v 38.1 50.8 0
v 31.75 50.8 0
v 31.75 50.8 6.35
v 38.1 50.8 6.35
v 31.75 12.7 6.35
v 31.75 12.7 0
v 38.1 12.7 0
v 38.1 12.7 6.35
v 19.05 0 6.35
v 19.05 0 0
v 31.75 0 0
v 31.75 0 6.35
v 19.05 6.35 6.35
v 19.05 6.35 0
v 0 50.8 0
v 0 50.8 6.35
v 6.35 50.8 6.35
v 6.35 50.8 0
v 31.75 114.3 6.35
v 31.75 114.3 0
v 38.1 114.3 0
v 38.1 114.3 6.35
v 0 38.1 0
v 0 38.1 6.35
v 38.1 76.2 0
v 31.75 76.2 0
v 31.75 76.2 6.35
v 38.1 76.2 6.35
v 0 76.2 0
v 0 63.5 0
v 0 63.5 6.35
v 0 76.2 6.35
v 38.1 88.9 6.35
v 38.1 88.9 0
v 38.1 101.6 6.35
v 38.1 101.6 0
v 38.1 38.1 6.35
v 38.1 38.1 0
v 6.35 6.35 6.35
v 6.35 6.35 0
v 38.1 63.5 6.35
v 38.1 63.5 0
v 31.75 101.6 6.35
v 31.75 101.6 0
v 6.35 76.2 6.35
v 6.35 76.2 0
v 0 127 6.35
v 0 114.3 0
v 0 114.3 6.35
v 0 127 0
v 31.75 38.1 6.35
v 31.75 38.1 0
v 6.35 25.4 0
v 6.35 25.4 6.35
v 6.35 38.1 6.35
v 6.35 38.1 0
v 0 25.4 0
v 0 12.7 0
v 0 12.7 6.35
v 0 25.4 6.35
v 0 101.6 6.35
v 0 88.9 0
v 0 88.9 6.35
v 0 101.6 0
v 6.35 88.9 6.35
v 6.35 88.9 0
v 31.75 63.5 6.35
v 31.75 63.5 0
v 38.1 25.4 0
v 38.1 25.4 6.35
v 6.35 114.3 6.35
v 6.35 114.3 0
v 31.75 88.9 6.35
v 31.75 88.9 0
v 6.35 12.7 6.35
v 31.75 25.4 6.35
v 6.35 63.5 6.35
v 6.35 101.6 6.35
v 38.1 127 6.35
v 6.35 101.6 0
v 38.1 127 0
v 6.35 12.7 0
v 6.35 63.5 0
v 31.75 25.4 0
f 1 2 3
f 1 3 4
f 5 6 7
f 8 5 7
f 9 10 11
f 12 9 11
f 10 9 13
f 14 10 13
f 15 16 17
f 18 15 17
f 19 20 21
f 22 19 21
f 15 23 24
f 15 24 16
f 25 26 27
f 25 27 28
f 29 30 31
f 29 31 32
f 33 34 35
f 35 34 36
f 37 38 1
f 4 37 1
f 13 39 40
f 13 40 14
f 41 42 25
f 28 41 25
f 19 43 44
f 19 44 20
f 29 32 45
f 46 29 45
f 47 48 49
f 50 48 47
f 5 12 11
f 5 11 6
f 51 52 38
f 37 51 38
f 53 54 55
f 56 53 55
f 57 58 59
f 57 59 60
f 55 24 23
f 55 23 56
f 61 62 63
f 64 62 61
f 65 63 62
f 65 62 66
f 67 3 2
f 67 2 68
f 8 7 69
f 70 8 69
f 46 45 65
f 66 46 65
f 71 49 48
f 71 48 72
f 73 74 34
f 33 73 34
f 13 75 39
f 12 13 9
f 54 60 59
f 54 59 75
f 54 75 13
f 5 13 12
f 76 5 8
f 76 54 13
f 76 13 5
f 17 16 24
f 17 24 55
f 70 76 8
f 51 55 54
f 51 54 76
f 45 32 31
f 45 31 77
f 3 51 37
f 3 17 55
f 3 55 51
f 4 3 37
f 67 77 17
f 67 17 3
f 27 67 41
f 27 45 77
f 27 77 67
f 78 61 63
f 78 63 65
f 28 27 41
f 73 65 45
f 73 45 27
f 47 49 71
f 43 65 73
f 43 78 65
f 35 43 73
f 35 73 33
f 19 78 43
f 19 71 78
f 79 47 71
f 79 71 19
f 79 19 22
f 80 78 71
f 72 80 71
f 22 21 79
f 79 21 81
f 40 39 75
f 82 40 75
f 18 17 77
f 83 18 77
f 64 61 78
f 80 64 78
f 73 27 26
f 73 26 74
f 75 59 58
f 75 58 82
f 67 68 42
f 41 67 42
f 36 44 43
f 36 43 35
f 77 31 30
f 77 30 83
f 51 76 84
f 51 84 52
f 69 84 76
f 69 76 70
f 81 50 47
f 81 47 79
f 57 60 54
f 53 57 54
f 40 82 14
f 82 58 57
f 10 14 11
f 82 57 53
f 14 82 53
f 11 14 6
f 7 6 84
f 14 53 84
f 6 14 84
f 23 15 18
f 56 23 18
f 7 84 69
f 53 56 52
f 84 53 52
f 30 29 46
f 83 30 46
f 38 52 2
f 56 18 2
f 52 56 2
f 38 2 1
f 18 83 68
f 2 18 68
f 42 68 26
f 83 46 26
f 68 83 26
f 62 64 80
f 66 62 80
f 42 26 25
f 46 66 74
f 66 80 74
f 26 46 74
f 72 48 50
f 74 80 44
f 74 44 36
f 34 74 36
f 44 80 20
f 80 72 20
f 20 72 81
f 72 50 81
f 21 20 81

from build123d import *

# Parameters (mm, degrees)
SKETCH1_W           = 38.1
SKETCH1_H           = 127
BOSS_EXTRUDE1_DEPTH = 6.35
SKETCH2_W           = 6.35
SKETCH2_H           = 12.7
CUT_EXTRUDE1_DEPTH  = 7.35
LPATTERN1_COUNT     = 6
LPATTERN1_PITCH     = 25.4
SKETCH3_W           = 12.7
SKETCH3_H           = 6.35
CUT_EXTRUDE2_DEPTH  = 7.35


with BuildPart() as part:
    # Sketch1 → Boss-Extrude1 (new body)
    with BuildSketch(Plane.XY):
        with Locations((19.05, 63.5)):
            Rectangle(SKETCH1_W, SKETCH1_H)
    extrude(amount=BOSS_EXTRUDE1_DEPTH)

    # Sketch2 → Cut-Extrude1 (cut, through all)
    with BuildSketch(Plane.XY.offset(6.35)):
        with Locations((3.175, 6.35)):
            Rectangle(SKETCH2_W, SKETCH2_H)
        with Locations((34.925, 6.35)):
            Rectangle(SKETCH2_W, SKETCH2_H)
    cut_extrude1 = extrude(amount=-CUT_EXTRUDE1_DEPTH, mode=Mode.SUBTRACT)

    # LPattern1: Cut-Extrude1 ×6
    with Locations(*[(0, i * LPATTERN1_PITCH, 0) for i in range(1, LPATTERN1_COUNT)]):
        add(cut_extrude1, mode=Mode.SUBTRACT)

    # Sketch3 → Cut-Extrude2 (cut, through all)
    with BuildSketch(Plane.XY.offset(6.35)):
        with Locations((12.7, 3.175)):
            Rectangle(SKETCH3_W, SKETCH3_H)
    extrude(amount=-CUT_EXTRUDE2_DEPTH, mode=Mode.SUBTRACT)


solid = part.part
